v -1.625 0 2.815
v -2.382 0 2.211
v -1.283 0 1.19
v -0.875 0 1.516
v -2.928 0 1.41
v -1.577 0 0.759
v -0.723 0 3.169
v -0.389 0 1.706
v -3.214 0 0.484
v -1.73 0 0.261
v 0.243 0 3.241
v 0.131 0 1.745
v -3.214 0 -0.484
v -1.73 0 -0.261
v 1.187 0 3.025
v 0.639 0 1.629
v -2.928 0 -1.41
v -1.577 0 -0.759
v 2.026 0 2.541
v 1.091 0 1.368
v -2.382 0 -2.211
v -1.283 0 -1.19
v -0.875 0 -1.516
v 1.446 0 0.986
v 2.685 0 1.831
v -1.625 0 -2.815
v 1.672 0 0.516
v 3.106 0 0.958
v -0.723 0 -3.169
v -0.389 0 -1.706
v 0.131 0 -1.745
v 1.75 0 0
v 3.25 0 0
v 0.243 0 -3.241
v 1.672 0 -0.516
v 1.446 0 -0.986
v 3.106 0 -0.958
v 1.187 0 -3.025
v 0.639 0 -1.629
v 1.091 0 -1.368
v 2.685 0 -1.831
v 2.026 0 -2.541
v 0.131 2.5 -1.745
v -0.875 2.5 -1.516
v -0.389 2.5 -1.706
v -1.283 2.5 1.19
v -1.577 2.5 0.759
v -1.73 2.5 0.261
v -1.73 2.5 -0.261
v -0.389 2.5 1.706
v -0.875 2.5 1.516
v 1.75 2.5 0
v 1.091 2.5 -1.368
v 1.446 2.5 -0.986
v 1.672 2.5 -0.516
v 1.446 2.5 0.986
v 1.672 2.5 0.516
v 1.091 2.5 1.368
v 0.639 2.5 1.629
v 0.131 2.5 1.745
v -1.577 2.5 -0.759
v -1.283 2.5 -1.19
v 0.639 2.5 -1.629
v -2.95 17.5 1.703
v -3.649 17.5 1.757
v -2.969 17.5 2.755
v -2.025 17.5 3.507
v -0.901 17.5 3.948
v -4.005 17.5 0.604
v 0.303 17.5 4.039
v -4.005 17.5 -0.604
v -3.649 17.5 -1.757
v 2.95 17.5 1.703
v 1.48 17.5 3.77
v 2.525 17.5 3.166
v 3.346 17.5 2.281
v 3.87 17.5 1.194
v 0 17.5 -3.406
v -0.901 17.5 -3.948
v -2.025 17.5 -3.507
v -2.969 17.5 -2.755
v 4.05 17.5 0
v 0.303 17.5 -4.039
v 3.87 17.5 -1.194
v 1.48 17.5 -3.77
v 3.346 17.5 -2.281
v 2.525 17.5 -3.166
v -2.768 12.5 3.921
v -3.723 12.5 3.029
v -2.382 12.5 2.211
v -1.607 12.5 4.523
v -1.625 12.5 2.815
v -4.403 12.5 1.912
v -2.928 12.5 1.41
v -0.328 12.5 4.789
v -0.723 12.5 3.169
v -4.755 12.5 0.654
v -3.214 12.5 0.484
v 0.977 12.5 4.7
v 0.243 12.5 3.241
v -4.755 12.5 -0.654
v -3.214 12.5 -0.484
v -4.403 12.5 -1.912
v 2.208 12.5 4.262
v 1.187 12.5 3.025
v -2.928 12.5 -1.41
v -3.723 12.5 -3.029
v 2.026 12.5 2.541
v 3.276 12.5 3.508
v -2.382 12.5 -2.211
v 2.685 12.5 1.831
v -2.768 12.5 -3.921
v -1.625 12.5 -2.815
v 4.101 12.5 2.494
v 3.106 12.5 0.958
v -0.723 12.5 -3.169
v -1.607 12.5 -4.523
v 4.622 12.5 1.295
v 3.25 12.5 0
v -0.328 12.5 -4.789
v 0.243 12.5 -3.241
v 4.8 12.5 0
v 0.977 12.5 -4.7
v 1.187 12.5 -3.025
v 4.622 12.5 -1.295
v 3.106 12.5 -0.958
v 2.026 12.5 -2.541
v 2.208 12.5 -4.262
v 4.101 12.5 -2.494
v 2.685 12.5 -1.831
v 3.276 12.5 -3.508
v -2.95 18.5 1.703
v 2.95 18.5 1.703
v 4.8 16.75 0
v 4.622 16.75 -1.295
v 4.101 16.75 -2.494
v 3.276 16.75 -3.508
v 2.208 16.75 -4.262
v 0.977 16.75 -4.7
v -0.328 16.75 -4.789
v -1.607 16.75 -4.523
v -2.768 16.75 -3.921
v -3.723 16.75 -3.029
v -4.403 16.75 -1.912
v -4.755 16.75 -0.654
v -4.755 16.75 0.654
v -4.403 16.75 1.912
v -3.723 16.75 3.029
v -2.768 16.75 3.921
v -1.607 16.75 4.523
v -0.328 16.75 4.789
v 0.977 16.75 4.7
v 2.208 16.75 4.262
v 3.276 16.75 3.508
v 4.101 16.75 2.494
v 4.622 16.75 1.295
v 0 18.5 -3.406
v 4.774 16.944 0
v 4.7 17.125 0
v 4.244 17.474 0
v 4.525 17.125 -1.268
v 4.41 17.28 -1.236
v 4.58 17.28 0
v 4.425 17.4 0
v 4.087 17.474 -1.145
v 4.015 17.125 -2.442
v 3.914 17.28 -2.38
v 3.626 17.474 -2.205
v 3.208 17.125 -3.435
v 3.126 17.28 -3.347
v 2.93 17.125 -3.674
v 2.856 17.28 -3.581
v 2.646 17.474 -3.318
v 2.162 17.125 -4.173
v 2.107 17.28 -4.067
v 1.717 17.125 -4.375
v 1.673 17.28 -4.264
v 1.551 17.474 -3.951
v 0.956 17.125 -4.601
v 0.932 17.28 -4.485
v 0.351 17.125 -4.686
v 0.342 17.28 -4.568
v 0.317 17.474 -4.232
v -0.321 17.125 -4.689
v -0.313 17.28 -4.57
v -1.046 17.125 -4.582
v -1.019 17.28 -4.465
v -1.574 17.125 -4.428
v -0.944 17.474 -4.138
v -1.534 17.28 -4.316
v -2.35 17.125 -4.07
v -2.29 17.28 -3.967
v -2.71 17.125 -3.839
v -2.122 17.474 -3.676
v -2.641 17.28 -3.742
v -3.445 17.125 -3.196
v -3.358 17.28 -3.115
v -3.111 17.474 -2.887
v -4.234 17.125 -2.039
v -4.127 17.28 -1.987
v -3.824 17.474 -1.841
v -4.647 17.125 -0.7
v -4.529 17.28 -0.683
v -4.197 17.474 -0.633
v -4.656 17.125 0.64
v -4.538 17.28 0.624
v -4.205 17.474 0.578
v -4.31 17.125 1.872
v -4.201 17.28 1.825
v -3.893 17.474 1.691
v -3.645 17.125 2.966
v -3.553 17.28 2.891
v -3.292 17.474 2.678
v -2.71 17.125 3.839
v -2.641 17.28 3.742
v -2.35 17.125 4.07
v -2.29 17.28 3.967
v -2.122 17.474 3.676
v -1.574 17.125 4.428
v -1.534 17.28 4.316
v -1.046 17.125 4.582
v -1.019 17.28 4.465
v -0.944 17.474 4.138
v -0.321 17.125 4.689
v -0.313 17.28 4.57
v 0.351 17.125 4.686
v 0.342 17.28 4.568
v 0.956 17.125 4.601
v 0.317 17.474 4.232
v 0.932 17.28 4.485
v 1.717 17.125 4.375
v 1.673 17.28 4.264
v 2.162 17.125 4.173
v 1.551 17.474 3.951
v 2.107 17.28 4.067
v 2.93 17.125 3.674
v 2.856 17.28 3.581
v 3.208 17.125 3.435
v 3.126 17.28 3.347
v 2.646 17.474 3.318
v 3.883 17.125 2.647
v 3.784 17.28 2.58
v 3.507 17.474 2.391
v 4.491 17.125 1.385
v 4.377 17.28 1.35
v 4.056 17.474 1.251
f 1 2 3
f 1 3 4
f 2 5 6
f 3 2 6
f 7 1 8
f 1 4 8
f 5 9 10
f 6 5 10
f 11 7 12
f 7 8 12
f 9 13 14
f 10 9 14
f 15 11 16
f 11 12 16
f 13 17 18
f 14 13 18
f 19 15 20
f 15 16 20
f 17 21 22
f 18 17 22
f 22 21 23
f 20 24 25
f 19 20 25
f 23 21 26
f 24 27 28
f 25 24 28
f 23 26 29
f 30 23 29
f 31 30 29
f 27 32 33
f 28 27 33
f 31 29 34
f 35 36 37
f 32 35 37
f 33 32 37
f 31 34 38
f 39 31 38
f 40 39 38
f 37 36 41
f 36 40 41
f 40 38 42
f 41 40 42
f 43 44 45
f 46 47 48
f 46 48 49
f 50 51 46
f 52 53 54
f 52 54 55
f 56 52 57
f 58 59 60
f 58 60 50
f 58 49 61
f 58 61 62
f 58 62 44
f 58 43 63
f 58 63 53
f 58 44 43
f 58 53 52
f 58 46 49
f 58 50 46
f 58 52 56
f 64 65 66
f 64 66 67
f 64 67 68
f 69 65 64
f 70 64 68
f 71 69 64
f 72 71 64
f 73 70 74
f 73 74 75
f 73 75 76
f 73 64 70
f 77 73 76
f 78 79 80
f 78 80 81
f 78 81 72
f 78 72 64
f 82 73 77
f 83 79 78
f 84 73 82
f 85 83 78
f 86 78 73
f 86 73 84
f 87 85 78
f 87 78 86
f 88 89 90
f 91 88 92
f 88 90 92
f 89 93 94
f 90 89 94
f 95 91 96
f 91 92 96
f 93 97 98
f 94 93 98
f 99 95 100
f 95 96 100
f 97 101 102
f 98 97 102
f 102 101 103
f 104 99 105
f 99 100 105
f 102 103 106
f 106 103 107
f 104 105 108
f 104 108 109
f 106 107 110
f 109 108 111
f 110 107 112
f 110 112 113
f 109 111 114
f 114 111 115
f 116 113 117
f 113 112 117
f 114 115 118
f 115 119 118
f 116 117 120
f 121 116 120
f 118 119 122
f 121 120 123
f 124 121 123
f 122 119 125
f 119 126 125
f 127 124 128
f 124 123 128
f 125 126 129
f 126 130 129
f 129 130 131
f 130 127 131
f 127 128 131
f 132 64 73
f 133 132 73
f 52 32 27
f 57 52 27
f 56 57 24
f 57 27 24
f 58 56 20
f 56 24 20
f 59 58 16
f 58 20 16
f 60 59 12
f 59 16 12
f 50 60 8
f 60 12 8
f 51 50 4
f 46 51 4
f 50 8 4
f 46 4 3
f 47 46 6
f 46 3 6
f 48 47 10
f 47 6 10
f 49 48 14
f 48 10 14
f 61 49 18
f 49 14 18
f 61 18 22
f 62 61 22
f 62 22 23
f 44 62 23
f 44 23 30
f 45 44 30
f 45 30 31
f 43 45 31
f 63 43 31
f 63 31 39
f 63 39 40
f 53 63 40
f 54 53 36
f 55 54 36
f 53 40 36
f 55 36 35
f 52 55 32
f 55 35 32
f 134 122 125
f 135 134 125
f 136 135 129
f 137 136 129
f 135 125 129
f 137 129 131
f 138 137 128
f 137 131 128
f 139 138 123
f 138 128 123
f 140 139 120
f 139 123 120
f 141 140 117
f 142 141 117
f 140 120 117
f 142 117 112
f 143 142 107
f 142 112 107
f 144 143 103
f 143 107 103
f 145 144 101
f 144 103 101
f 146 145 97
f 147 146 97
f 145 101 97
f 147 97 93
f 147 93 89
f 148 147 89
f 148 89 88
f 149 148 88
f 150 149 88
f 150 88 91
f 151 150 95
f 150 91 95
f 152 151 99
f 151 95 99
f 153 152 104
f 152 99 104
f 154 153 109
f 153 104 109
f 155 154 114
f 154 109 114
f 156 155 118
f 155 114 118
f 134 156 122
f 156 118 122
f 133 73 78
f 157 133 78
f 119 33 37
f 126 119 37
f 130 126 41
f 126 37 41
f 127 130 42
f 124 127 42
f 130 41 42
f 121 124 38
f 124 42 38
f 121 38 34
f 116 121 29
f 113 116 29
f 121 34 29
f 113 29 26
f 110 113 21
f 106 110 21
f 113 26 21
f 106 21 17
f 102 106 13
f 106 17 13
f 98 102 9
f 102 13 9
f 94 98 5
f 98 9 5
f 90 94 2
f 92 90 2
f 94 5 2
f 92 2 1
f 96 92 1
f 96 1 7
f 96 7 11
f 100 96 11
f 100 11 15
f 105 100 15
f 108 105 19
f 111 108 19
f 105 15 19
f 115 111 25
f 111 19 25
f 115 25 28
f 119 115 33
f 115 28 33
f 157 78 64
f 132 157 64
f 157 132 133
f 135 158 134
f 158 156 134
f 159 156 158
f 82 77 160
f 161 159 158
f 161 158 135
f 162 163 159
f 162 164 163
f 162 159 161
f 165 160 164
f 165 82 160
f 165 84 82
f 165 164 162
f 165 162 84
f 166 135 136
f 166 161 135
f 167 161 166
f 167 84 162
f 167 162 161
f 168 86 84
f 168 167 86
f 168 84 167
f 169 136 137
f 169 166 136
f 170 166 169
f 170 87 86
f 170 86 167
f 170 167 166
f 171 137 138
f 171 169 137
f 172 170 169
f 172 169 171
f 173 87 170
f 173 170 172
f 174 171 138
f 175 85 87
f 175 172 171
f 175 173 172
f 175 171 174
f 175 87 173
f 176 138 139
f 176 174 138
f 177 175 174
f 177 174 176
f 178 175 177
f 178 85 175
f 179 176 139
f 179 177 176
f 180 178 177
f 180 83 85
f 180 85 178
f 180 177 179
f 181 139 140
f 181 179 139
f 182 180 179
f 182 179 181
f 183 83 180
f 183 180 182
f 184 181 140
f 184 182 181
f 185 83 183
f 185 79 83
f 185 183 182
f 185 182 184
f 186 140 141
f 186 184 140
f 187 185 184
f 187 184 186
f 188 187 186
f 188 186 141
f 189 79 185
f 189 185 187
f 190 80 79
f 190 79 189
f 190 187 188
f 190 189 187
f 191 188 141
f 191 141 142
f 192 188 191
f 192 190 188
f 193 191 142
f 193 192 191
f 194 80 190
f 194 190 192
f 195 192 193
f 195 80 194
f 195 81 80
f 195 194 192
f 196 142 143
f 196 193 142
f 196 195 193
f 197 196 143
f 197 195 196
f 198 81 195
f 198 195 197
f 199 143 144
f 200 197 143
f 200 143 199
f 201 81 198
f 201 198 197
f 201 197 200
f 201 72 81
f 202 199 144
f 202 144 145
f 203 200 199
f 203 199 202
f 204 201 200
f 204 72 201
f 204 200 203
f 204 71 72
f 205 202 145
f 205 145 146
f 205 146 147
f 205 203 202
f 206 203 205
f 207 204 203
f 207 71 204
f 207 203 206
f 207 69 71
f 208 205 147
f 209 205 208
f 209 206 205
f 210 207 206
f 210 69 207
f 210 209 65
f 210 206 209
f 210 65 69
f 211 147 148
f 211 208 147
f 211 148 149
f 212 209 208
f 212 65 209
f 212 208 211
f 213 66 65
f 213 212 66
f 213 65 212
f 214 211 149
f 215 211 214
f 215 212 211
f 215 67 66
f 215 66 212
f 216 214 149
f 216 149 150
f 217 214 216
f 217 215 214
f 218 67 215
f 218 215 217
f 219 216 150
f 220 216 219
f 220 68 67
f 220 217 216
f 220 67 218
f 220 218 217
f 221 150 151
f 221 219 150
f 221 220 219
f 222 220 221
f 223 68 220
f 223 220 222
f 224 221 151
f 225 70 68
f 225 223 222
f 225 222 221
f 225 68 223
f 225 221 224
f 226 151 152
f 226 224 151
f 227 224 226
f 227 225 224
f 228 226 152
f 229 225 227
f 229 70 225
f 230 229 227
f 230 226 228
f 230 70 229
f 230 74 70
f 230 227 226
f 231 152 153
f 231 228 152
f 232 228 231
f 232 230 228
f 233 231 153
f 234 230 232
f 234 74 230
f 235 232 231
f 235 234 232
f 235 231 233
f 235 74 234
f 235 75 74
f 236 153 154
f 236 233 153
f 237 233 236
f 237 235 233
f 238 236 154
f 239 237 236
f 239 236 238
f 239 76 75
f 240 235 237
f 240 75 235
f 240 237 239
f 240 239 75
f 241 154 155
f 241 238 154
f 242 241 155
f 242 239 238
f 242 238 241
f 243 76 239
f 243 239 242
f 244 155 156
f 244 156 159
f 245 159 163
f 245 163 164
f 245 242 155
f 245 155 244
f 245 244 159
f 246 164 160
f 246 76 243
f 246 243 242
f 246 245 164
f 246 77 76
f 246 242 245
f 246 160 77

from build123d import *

# Parameters (mm, degrees)
SKETCH1_R           = 3.25
BOSS_EXTRUDE1_DEPTH = 12.5
SKETCH2_R           = 1.75
CUT_EXTRUDE1_DEPTH  = 2.5
SKETCH6_R           = 4.8
BOSS_EXTRUDE2_DEPTH = 5
BOSS_EXTRUDE5_DEPTH = 1
FILLET1_R           = 0.75


with BuildPart() as part:
    # Sketch1 → Boss-Extrude1 (new body)
    with BuildSketch(Plane(origin=(0, 0, 0), x_dir=(1, 0, 0), z_dir=(0, 1, 0))):
        Circle(SKETCH1_R)
    extrude(amount=BOSS_EXTRUDE1_DEPTH)

    # Sketch2 → Cut-Extrude1 (cut)
    with BuildSketch(Plane.XZ):
        Circle(SKETCH2_R)
    extrude(amount=-CUT_EXTRUDE1_DEPTH, mode=Mode.SUBTRACT)

    # Sketch6 → Boss-Extrude2 (add)
    with BuildSketch(Plane(origin=(0, 12.5, 0), x_dir=(1, 0, 0), z_dir=(0, 1, 0))):
        Circle(SKETCH6_R)
    extrude(amount=BOSS_EXTRUDE2_DEPTH)

    # Sketch7 → Boss-Extrude5 (add)
    with BuildSketch(Plane(origin=(0, 17.5, 0), x_dir=(1, 0, 0), z_dir=(0, 1, 0))):
        Polygon((2.95, -1.703183294), (0, 3.406366588), (-2.95, -1.703183294), align=None)
    extrude(amount=BOSS_EXTRUDE5_DEPTH)

    # Fillet1
    fillet1_edges = [part.edges().sort_by_distance(p)[0] for p in [
        (-4.8, 17.5, 0),
    ]]
    fillet(fillet1_edges, radius=FILLET1_R)


solid = part.part
